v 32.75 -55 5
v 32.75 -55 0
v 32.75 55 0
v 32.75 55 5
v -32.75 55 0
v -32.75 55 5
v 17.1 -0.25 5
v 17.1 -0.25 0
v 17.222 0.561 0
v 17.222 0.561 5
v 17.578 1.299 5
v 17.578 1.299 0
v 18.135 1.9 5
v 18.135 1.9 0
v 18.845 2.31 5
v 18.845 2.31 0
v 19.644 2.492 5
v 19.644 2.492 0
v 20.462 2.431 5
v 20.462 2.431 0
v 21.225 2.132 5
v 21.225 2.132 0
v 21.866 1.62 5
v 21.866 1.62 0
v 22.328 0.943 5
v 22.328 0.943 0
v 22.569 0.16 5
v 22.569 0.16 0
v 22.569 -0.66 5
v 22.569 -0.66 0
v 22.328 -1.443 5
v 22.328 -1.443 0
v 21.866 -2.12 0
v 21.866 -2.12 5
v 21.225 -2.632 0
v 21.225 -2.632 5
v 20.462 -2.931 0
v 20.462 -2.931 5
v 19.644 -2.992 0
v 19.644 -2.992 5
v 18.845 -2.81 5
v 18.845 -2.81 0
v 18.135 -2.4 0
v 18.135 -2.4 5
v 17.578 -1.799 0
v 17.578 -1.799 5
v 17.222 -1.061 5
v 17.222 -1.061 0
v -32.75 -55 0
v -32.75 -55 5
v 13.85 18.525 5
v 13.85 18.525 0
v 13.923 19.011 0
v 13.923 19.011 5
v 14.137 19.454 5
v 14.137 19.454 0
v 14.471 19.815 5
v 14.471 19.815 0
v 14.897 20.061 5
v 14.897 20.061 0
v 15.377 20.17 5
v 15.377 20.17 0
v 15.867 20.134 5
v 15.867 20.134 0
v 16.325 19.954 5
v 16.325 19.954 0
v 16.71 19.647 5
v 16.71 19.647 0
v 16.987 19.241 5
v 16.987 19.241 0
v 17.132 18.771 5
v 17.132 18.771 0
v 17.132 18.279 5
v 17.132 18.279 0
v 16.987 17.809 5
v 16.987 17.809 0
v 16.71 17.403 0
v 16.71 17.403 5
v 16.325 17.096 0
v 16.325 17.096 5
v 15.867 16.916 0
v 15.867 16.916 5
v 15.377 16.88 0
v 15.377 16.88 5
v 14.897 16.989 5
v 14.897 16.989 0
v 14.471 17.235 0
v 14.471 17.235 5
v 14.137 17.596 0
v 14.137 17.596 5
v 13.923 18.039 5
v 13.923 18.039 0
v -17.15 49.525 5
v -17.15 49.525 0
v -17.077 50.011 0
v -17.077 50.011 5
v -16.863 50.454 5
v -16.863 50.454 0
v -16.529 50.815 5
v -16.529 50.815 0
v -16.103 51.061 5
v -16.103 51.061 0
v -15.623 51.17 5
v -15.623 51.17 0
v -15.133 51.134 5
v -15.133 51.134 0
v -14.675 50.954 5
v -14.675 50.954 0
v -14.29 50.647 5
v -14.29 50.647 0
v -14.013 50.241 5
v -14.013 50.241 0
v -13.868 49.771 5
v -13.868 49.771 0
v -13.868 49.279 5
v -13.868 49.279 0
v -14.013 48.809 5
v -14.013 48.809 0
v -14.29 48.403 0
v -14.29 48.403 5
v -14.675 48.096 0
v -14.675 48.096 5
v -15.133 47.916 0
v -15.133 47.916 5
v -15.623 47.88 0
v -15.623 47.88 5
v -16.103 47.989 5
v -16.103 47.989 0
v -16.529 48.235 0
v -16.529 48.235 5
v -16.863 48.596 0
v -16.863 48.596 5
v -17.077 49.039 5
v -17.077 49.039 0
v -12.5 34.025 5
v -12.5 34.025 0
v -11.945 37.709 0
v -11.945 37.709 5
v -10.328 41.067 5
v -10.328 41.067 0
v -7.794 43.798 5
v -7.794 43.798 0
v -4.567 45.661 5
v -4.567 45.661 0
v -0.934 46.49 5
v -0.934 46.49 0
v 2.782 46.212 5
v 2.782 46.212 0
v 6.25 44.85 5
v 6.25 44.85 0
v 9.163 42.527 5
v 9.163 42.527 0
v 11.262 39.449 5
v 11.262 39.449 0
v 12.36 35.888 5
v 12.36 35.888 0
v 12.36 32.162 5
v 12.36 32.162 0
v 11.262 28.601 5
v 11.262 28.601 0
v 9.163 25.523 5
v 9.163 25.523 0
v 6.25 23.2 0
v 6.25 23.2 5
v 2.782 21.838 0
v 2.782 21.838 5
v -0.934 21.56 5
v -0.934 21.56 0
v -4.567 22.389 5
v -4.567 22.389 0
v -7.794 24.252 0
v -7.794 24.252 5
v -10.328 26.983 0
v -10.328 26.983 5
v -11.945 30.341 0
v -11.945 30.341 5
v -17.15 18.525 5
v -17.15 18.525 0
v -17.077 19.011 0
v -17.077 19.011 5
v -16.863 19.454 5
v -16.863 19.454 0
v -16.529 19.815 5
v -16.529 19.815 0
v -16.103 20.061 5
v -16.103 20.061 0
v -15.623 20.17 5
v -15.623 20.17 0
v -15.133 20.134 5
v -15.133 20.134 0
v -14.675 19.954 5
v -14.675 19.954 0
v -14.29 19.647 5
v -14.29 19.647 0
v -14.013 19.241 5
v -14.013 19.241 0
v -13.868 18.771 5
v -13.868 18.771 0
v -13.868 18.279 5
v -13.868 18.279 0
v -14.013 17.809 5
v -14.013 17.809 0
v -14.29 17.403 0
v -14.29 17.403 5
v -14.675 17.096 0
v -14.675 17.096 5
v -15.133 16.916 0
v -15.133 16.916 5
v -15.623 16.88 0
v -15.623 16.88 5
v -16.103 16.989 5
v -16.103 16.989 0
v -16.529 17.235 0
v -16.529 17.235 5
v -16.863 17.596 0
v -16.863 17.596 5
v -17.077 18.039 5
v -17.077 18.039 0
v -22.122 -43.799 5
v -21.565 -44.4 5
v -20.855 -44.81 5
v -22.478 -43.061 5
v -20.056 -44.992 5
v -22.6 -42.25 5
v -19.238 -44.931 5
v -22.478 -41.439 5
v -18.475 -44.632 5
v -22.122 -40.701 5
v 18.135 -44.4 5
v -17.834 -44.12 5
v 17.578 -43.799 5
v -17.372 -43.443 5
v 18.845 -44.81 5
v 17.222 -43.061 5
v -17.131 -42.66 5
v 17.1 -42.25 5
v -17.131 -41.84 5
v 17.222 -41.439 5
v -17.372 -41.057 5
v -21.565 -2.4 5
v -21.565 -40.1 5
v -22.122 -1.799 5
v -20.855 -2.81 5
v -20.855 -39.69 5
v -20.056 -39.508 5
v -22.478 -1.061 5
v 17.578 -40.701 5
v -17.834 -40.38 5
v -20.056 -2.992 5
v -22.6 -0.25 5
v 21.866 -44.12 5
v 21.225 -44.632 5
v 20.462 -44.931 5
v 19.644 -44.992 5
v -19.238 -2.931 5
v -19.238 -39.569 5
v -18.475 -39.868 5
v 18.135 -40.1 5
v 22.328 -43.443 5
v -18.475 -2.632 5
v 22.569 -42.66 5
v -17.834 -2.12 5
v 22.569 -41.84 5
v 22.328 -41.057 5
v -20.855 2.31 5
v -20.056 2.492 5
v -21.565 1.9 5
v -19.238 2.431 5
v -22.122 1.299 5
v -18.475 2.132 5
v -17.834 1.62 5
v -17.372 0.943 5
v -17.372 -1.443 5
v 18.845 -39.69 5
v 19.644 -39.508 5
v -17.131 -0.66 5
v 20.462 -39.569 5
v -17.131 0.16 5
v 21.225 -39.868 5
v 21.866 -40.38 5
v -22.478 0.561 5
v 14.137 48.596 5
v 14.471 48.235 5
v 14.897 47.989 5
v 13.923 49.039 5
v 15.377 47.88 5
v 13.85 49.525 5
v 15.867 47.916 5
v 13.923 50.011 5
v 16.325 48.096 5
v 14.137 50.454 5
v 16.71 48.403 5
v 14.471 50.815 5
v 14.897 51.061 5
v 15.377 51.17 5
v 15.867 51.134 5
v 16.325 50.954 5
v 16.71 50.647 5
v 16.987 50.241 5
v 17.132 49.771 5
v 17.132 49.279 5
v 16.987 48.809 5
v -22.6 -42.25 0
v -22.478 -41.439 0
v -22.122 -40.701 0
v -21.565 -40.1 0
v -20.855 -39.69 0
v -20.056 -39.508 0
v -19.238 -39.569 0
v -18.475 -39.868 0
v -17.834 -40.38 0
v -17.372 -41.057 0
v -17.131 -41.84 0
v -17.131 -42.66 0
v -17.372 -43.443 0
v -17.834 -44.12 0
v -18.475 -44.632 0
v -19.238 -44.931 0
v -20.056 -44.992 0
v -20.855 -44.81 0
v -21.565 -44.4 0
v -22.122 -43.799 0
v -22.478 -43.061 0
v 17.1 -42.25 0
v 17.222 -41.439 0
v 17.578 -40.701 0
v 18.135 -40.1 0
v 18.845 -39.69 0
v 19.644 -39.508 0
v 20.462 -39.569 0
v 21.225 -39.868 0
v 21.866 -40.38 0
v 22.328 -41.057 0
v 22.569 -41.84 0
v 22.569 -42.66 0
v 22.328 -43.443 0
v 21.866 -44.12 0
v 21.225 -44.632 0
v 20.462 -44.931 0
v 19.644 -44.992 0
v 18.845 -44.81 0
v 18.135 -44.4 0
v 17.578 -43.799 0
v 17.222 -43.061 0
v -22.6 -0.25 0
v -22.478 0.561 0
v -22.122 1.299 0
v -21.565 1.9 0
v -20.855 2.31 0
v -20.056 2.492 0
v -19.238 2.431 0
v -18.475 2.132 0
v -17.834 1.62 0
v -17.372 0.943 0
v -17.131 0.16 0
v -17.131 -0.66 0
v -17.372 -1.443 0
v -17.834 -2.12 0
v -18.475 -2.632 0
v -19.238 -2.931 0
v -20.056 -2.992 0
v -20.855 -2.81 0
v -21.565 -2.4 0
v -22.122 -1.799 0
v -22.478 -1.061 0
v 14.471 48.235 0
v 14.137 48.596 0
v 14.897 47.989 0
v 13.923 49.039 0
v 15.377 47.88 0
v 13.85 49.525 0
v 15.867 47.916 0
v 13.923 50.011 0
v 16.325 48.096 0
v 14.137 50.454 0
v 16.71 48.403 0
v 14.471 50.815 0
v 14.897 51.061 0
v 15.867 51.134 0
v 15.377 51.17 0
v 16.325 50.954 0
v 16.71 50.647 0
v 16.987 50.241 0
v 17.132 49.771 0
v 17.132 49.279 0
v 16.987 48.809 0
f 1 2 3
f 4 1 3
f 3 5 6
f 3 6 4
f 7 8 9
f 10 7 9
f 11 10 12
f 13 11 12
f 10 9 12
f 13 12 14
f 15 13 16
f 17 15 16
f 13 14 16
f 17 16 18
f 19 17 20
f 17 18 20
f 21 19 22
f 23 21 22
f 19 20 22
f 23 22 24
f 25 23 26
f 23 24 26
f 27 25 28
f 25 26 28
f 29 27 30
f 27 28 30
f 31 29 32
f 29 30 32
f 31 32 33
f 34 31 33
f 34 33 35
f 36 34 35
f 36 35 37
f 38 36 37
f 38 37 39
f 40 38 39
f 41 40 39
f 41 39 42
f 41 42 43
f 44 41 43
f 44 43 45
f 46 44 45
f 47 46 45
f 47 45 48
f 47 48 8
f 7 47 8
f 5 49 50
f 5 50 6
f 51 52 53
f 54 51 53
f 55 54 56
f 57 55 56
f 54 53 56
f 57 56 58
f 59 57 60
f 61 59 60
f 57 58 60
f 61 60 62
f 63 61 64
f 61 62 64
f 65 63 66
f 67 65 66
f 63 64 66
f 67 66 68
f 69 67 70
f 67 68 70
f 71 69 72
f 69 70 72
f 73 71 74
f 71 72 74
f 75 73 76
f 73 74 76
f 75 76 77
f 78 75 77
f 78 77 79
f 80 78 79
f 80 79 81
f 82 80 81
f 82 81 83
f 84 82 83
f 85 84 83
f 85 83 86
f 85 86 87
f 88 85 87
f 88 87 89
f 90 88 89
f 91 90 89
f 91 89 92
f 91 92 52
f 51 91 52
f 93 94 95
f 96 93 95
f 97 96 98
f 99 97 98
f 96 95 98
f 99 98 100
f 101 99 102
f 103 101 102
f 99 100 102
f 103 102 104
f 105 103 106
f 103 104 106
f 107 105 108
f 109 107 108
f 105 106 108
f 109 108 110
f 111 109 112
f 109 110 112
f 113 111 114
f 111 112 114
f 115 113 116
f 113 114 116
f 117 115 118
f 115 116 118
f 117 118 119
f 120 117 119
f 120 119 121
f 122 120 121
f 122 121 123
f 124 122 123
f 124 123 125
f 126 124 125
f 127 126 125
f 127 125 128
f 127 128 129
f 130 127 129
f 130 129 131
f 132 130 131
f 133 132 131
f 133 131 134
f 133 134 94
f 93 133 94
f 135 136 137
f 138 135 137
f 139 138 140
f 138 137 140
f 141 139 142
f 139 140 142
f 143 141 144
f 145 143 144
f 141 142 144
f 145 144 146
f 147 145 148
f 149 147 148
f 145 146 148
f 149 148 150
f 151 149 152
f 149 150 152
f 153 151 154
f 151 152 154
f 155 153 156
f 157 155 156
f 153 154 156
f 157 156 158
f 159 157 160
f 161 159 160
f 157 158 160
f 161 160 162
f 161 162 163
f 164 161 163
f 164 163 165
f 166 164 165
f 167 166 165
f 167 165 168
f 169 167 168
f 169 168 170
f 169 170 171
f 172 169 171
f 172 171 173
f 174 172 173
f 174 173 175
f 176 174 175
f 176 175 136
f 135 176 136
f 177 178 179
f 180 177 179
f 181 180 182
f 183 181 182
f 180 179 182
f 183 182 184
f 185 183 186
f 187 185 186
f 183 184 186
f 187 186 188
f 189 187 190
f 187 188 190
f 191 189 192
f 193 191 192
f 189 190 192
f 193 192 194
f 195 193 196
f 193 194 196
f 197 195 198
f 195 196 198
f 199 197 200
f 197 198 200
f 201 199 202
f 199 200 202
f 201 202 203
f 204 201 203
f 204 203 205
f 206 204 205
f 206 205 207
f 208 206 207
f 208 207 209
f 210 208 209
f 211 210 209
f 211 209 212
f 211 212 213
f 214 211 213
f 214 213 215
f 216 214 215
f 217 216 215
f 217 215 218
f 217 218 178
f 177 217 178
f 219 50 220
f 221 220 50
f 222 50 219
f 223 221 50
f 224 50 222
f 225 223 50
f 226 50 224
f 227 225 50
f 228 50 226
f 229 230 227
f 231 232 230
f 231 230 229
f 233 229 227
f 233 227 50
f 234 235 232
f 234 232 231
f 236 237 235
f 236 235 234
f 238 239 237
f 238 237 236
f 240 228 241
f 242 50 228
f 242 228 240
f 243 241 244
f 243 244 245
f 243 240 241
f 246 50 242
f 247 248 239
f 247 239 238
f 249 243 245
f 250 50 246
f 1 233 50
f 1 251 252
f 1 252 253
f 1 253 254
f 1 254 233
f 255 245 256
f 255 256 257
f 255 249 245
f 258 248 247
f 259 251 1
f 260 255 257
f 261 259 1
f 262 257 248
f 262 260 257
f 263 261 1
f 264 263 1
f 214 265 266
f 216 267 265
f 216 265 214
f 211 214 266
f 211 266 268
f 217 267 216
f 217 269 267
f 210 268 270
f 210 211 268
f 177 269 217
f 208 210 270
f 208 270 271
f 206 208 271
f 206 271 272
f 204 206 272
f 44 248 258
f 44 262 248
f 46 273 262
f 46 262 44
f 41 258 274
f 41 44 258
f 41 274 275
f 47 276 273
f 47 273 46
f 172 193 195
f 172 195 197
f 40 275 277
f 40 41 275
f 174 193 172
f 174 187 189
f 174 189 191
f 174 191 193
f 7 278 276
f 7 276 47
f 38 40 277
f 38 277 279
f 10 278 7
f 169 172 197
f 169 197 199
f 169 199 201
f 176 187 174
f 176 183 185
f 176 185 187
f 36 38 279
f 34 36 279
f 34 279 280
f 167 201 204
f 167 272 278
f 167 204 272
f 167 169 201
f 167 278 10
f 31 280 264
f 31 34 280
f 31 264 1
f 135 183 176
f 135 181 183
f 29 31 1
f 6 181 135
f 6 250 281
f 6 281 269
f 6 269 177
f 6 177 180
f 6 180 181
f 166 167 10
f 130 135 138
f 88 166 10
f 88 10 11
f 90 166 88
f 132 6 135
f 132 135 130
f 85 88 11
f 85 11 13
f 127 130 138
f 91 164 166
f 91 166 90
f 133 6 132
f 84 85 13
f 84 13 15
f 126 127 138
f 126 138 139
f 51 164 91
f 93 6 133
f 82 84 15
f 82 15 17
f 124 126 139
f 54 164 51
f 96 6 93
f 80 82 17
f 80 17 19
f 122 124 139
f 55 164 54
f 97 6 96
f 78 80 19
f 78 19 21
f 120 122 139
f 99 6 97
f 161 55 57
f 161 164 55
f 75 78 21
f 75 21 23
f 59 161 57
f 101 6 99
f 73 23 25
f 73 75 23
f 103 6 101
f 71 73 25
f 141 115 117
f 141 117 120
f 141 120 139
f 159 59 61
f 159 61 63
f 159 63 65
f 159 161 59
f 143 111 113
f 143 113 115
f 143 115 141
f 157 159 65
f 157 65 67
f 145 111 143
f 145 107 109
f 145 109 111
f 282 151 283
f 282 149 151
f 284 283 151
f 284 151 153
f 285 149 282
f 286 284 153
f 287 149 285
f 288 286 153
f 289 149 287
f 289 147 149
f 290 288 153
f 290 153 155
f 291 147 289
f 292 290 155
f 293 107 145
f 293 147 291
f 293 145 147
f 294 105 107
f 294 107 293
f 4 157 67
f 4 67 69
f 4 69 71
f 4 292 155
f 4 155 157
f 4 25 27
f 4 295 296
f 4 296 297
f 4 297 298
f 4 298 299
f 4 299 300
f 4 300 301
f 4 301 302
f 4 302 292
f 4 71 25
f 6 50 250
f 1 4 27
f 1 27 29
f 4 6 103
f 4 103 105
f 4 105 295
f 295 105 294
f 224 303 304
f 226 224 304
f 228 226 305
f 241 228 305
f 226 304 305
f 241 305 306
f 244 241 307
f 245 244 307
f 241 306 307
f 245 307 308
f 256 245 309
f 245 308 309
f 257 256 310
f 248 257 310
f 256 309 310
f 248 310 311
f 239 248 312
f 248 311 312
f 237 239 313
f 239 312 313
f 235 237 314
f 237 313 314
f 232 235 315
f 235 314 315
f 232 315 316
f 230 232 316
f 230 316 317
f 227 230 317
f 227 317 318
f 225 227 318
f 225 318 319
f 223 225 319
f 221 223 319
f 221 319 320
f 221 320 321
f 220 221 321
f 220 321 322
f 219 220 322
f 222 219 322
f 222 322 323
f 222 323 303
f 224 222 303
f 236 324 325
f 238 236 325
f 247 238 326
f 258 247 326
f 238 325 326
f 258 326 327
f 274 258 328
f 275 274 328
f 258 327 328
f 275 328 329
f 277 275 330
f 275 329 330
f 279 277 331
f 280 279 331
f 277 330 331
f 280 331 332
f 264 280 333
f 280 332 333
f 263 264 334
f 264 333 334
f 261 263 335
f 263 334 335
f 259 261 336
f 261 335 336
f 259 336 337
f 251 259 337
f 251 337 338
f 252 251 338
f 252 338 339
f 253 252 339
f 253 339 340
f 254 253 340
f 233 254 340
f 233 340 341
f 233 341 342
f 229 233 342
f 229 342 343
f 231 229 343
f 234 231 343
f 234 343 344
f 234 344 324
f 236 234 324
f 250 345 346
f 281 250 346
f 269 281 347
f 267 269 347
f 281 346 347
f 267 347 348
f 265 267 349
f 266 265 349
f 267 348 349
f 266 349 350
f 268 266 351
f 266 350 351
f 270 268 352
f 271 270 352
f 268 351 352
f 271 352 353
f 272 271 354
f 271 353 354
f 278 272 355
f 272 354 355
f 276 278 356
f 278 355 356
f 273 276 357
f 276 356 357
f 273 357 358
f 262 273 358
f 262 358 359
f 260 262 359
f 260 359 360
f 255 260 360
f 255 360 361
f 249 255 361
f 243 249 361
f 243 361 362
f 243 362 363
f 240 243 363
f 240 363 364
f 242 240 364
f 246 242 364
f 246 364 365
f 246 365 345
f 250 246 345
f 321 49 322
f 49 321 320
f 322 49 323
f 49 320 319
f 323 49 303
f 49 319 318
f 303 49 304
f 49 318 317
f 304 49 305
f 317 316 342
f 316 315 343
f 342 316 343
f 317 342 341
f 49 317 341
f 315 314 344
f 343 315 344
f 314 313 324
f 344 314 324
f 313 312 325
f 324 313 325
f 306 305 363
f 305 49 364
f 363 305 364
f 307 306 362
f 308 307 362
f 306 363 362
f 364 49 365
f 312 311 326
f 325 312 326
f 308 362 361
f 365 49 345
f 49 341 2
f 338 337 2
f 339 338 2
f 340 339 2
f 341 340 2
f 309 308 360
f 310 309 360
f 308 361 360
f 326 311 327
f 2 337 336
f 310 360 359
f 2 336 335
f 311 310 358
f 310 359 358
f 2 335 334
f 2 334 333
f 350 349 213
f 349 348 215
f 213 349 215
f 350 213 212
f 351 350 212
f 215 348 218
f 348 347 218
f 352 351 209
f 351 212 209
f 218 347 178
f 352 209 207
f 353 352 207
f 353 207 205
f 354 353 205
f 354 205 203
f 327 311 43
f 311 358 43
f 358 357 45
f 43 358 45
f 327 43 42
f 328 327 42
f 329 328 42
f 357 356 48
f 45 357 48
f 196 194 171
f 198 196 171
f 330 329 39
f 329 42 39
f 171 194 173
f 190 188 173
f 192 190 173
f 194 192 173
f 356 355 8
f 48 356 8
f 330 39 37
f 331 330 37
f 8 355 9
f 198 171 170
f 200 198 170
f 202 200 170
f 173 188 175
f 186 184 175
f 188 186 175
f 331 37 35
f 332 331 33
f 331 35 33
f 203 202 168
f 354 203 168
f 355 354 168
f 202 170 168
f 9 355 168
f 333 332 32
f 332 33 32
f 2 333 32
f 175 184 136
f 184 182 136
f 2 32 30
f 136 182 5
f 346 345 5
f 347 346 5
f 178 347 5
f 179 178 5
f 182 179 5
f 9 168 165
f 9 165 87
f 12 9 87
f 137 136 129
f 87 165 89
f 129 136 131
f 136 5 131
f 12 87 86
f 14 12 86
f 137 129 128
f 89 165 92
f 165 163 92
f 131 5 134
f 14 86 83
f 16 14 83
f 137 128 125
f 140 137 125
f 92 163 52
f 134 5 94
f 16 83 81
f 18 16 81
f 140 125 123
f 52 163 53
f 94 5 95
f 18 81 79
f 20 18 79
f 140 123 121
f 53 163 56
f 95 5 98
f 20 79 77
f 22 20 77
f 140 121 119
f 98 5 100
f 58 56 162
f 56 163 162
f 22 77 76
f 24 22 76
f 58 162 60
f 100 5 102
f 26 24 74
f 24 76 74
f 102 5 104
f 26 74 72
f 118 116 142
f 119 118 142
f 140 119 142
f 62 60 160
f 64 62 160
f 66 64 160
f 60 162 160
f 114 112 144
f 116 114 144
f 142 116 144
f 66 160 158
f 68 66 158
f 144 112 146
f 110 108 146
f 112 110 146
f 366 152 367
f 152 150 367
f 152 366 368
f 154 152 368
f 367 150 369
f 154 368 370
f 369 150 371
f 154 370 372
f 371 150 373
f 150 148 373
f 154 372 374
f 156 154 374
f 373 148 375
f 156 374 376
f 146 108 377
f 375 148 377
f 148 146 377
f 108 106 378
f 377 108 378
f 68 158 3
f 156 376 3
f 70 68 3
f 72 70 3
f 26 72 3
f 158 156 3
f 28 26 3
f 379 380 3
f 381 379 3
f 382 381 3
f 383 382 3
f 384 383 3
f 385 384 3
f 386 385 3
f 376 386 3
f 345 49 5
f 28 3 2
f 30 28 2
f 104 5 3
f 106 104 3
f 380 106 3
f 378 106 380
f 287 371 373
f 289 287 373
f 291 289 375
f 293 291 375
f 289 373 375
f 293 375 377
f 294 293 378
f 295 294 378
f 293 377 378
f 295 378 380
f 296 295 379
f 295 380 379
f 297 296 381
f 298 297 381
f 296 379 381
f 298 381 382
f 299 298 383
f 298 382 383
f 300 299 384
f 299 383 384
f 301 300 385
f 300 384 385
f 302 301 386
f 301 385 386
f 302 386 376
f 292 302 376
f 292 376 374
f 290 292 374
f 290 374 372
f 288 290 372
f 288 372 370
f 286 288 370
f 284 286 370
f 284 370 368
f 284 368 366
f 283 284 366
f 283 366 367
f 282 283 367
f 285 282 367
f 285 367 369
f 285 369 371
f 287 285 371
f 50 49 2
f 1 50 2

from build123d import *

# Parameters (mm, degrees)
SKETCH1_W           = 65.5
SKETCH1_H           = 110
BOSS_EXTRUDE1_DEPTH = 5
SKETCH2_R           = 12.5
CUT_EXTRUDE1_DEPTH  = 65.207184177
SKETCH3_R           = 1.65
CUT_EXTRUDE2_DEPTH  = 65.207184177
SKETCH4_R           = 2.75
CUT_EXTRUDE3_DEPTH  = 65.207184177


with BuildPart() as part:
    # Sketch1 → Boss-Extrude1 (new body)
    with BuildSketch(Plane.XY):
        Rectangle(SKETCH1_W, SKETCH1_H)
    extrude(amount=BOSS_EXTRUDE1_DEPTH)

    # Sketch2 → Cut-Extrude1 (cut, through all)
    with BuildSketch(Plane(origin=(0, 0, 0), x_dir=(-1, 0, 0), z_dir=(0, 0, -1))):
        with Locations((0, 34.025)):
            Circle(SKETCH2_R)
    extrude(amount=-CUT_EXTRUDE1_DEPTH, mode=Mode.SUBTRACT)

    # Sketch3 → Cut-Extrude2 (cut, through all)
    with BuildSketch(Plane(origin=(0, 0, 0), x_dir=(-1, 0, 0), z_dir=(0, 0, -1))):
        with Locations((-15.5, 49.525)):
            Circle(SKETCH3_R)
        with Locations((-15.5, 18.525)):
            Circle(SKETCH3_R)
        with Locations((15.5, 18.525)):
            Circle(SKETCH3_R)
        with Locations((15.5, 49.525)):
            Circle(SKETCH3_R)
    extrude(amount=-CUT_EXTRUDE2_DEPTH, mode=Mode.SUBTRACT)

    # Sketch4 → Cut-Extrude3 (cut, through all)
    with BuildSketch(Plane(origin=(0, 0, 0), x_dir=(-1, 0, 0), z_dir=(0, 0, -1))):
        with Locations((-19.85, -0.25)):
            Circle(SKETCH4_R)
        with Locations((19.85, -0.25)):
            Circle(SKETCH4_R)
        with Locations((19.85, -42.25)):
            Circle(SKETCH4_R)
        with Locations((-19.85, -42.25)):
            Circle(SKETCH4_R)
    extrude(amount=-CUT_EXTRUDE3_DEPTH, mode=Mode.SUBTRACT)


solid = part.part
